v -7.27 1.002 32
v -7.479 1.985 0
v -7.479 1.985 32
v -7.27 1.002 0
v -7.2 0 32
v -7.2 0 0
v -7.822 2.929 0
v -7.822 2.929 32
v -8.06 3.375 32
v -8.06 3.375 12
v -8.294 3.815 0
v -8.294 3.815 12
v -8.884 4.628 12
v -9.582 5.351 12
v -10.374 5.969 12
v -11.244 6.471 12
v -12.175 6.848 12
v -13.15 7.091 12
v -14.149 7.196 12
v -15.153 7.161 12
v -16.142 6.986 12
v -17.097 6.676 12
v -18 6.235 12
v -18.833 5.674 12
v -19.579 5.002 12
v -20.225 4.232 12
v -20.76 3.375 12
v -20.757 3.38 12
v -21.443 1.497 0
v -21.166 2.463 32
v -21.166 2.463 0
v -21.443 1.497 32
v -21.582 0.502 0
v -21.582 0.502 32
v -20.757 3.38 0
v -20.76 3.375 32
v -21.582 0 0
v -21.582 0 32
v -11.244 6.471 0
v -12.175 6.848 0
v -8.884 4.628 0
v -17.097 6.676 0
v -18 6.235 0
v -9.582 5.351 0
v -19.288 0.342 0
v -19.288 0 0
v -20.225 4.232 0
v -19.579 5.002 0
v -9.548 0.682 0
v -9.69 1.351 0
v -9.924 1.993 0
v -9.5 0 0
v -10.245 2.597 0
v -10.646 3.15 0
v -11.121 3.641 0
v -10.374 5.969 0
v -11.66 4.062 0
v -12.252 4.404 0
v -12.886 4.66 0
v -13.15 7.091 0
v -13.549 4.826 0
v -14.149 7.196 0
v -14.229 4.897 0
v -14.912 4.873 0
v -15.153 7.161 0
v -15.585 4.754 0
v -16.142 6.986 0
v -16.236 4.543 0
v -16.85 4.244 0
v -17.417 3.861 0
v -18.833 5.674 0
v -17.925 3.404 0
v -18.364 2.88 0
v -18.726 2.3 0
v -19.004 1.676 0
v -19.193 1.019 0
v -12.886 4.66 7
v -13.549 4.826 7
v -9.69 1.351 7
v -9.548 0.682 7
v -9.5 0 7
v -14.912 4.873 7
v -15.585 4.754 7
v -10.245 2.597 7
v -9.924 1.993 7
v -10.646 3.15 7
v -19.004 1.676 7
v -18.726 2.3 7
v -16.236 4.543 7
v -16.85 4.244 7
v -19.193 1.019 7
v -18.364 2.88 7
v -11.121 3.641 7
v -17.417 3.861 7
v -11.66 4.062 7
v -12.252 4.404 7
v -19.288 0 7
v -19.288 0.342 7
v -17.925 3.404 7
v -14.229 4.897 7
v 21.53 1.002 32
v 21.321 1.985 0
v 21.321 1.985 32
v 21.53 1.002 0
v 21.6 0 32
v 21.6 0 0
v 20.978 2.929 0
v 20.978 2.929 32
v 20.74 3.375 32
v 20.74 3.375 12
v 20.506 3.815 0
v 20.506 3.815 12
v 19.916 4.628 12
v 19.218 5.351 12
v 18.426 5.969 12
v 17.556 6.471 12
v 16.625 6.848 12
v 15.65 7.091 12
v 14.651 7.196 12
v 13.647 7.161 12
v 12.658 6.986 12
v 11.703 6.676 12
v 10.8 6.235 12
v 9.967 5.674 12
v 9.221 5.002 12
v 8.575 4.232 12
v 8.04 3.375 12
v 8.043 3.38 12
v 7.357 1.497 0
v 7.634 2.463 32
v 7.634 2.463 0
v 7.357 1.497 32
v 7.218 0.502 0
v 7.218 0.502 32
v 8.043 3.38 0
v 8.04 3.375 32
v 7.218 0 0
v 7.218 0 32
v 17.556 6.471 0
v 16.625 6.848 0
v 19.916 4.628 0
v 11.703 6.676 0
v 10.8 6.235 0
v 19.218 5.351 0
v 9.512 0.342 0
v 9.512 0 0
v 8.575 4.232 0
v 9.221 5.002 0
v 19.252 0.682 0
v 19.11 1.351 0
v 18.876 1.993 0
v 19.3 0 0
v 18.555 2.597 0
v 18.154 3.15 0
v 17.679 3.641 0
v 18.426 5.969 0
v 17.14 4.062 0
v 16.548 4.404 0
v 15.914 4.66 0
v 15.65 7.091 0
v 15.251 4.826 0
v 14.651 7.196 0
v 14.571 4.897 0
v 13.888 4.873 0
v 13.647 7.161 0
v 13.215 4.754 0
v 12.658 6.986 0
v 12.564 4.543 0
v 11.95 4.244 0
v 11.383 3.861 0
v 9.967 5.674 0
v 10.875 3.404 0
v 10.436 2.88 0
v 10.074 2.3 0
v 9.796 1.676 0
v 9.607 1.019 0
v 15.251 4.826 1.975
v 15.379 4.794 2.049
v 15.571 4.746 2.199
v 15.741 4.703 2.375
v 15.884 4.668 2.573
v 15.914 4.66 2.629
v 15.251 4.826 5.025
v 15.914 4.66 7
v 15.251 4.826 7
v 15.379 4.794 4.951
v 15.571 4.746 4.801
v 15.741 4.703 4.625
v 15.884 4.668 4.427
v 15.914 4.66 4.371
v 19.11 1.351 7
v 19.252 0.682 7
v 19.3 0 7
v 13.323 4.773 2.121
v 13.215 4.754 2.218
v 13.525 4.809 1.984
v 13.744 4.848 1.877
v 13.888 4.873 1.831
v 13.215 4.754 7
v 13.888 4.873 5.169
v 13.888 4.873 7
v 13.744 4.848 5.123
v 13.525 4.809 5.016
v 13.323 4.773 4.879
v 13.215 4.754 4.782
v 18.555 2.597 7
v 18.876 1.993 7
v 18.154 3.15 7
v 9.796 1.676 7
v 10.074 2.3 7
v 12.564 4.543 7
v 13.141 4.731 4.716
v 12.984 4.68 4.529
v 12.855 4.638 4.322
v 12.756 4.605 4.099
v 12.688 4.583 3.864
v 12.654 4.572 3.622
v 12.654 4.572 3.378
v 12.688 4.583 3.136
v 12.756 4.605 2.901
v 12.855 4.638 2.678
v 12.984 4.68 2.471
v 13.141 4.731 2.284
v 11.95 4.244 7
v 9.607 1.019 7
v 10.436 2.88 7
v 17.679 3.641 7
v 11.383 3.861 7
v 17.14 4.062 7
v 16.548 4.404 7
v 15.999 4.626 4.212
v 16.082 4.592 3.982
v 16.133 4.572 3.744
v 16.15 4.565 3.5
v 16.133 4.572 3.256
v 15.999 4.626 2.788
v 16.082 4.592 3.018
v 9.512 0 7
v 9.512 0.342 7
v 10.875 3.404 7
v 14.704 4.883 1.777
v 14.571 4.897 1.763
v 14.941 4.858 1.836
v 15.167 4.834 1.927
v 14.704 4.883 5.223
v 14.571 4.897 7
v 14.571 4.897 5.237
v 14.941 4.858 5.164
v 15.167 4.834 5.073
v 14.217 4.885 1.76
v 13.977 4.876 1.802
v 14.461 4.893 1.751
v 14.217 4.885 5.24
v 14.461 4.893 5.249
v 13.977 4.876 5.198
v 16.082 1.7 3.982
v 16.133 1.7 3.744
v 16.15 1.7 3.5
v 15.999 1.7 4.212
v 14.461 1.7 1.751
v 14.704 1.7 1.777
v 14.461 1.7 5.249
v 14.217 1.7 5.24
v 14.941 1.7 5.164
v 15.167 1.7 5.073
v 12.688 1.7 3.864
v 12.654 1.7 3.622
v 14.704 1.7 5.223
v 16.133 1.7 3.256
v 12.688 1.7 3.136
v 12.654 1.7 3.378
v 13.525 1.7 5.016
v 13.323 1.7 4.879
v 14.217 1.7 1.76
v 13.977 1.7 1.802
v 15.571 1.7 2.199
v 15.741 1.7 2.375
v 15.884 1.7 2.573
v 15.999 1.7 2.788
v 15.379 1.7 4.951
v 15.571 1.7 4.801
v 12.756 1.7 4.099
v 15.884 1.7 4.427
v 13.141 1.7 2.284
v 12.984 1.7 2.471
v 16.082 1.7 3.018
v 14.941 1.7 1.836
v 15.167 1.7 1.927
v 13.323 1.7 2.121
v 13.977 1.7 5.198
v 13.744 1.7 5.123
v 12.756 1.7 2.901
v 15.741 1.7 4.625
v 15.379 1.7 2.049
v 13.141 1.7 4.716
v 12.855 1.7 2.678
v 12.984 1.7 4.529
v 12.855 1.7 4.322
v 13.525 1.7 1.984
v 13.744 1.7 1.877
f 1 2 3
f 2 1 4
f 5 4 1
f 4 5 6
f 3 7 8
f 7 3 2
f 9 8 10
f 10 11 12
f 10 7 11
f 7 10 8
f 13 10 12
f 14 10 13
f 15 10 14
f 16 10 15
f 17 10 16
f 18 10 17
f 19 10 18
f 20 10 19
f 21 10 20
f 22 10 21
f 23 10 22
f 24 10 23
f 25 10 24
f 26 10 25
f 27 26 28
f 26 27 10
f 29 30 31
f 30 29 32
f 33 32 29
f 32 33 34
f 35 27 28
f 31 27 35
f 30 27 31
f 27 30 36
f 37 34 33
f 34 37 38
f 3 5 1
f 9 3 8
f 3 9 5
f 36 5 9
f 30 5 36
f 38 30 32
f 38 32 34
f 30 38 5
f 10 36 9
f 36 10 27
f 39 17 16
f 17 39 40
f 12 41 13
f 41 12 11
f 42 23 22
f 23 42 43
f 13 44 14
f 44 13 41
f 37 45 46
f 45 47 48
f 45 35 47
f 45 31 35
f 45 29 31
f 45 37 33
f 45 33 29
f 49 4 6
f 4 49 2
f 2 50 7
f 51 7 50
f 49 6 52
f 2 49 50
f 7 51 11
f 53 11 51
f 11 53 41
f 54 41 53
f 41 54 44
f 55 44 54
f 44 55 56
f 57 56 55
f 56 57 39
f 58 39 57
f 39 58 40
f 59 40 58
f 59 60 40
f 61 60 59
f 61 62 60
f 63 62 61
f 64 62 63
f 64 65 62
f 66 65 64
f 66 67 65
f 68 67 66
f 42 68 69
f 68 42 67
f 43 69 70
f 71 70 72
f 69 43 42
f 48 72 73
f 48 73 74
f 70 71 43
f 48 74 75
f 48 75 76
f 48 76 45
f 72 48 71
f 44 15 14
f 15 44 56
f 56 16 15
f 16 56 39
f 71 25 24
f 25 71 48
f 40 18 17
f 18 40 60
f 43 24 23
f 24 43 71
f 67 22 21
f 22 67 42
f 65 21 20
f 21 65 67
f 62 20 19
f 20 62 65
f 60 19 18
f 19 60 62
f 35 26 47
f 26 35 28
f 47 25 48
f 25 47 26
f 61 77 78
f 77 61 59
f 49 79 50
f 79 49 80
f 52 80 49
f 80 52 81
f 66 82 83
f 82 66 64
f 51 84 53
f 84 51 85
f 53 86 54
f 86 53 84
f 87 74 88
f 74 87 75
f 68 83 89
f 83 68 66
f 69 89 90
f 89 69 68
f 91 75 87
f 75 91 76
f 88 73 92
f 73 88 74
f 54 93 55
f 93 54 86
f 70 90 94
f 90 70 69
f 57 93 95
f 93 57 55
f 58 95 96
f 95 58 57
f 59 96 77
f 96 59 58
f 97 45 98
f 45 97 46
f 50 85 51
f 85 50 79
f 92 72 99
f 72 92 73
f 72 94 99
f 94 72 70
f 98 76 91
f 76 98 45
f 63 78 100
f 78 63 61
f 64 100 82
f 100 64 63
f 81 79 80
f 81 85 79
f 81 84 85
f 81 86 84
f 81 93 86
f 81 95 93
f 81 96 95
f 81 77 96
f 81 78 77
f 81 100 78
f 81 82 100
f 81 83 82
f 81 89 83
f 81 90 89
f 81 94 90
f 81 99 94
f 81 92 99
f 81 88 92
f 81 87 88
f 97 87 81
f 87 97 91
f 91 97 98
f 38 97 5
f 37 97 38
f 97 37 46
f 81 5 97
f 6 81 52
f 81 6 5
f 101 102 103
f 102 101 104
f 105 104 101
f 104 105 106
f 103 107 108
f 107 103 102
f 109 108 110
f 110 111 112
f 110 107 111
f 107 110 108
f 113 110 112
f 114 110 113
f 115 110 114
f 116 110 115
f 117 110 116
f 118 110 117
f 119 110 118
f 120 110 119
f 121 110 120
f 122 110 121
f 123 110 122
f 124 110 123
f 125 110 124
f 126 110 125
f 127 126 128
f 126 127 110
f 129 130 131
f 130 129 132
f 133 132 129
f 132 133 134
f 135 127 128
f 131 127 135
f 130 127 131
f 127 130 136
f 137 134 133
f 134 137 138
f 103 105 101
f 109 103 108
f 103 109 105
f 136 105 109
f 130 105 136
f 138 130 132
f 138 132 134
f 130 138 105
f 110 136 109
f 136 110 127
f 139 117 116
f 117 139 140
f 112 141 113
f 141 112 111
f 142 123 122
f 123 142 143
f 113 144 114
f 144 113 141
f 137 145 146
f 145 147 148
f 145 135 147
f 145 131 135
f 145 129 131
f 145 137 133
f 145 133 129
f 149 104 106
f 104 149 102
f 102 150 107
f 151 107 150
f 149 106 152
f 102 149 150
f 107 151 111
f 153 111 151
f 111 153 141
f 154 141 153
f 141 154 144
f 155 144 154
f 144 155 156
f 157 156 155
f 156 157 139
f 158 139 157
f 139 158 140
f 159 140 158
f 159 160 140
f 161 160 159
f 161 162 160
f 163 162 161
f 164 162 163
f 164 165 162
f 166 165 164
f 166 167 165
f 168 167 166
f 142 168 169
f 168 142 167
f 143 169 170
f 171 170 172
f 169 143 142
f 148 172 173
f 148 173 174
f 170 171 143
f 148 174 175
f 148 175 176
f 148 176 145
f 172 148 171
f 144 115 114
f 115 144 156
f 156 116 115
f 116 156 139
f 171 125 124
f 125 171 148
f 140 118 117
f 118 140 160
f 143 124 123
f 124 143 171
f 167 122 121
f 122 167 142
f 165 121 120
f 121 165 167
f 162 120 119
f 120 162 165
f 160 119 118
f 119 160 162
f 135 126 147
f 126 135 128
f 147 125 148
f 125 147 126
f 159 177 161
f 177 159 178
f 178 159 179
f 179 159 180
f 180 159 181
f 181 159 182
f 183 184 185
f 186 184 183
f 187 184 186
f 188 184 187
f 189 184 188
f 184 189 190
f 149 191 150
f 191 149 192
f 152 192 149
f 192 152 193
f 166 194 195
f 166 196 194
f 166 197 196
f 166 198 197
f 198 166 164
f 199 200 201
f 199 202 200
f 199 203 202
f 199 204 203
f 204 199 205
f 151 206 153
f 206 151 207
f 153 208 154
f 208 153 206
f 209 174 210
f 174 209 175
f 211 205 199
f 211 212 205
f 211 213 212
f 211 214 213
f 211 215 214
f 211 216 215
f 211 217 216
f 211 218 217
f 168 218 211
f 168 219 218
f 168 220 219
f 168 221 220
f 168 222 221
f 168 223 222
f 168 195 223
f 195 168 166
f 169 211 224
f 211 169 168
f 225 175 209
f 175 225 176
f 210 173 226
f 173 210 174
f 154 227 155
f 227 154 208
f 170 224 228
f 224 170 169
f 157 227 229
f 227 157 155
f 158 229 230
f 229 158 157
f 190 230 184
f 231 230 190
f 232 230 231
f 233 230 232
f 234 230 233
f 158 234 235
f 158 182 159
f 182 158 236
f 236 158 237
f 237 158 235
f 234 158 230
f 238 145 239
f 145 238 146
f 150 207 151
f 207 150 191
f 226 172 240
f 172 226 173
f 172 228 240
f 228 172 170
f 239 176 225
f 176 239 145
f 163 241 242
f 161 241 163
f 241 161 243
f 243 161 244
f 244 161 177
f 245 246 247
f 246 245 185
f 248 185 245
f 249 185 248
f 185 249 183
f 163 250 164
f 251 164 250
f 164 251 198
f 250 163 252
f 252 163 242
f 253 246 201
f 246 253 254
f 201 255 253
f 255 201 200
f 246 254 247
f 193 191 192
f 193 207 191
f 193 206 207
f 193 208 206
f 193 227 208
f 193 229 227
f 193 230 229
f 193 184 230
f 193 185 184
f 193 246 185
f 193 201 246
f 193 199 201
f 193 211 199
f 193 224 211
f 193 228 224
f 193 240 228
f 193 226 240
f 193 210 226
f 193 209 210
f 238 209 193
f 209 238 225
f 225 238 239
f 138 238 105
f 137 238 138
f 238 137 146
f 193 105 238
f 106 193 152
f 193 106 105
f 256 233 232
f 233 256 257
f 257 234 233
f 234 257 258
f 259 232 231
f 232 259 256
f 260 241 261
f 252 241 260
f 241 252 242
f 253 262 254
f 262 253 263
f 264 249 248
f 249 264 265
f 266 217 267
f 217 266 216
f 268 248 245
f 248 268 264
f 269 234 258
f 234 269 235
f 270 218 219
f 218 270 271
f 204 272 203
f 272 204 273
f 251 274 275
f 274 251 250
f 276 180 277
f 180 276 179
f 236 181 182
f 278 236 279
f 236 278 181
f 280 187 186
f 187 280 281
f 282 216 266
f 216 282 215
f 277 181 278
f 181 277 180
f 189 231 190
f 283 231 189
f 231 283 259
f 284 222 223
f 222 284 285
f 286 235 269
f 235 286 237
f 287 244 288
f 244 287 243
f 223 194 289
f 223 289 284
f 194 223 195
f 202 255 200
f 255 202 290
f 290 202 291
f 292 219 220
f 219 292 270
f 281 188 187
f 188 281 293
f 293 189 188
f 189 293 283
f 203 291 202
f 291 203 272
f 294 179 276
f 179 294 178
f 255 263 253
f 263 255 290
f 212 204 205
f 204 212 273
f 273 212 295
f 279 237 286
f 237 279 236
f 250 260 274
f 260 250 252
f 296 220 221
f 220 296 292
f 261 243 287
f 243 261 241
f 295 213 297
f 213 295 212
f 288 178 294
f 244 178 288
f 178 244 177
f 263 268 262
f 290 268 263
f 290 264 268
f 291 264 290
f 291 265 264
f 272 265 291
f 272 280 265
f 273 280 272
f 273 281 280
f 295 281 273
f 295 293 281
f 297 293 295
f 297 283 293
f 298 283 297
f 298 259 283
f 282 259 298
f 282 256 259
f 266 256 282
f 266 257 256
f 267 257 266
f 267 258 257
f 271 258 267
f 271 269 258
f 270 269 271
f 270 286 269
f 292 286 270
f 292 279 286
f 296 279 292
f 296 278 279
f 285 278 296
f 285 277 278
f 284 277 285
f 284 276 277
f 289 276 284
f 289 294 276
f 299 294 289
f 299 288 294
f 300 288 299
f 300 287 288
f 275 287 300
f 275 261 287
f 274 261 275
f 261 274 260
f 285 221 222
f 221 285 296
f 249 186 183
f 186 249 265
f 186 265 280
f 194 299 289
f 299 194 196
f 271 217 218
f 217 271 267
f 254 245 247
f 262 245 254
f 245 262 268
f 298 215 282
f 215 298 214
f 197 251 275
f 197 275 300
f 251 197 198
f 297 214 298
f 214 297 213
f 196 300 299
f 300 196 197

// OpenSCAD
$fn = 45;

render() knob();

// As measured in the comments

module knob(
        d=14.40, // 14.7 mm
        baseH = 12, // 14 mm (upper bound)
        inD=9.8, // 9.5 mm
        inH=7, // 6.38 mm (lower bound)
        handleW=6.75, // 6.9 mm
        handleH=20, // 30 mm (upper bound)
        pinD=3.5, // 3.8 mm
        pinH=3.2 // 6 mm - 2.5 mm (knob wall)
    ) {
    assert(
        baseH + handleH > 14, 
        "The know is too short to be turned"
    );
    translate([-d, 0, 0]) 
        oneHalf(d, baseH, inD, inH, handleW, handleH);
    translate([d, 0, 0]) union() {
        oneHalf(d, baseH, inD, inH, handleW, handleH);
        translate([0, inD / 2, inH / 2])
            rotate([90, 0, 0])
                cylinder(h = pinH, d = pinD);
    }
}

module oneHalf(d, baseH, inD, inH, handleW, handleH) {
    intersection() {
        translate([-d / 2, 0, 0]) cube([d, d / 2, baseH + handleH]);
        union() {
            translate([0, 0, baseH]) {
                intersection() {
                    cylinder(handleH, d = d);
                    translate([-d / 2, -handleW / 2, 0]) 
                        cube([d, handleW, handleH]);
                }
            }
            difference() {
                cylinder(h = baseH, d = d);
                cylinder(h = inH, d = inD); 
            }
        }
    }
}
